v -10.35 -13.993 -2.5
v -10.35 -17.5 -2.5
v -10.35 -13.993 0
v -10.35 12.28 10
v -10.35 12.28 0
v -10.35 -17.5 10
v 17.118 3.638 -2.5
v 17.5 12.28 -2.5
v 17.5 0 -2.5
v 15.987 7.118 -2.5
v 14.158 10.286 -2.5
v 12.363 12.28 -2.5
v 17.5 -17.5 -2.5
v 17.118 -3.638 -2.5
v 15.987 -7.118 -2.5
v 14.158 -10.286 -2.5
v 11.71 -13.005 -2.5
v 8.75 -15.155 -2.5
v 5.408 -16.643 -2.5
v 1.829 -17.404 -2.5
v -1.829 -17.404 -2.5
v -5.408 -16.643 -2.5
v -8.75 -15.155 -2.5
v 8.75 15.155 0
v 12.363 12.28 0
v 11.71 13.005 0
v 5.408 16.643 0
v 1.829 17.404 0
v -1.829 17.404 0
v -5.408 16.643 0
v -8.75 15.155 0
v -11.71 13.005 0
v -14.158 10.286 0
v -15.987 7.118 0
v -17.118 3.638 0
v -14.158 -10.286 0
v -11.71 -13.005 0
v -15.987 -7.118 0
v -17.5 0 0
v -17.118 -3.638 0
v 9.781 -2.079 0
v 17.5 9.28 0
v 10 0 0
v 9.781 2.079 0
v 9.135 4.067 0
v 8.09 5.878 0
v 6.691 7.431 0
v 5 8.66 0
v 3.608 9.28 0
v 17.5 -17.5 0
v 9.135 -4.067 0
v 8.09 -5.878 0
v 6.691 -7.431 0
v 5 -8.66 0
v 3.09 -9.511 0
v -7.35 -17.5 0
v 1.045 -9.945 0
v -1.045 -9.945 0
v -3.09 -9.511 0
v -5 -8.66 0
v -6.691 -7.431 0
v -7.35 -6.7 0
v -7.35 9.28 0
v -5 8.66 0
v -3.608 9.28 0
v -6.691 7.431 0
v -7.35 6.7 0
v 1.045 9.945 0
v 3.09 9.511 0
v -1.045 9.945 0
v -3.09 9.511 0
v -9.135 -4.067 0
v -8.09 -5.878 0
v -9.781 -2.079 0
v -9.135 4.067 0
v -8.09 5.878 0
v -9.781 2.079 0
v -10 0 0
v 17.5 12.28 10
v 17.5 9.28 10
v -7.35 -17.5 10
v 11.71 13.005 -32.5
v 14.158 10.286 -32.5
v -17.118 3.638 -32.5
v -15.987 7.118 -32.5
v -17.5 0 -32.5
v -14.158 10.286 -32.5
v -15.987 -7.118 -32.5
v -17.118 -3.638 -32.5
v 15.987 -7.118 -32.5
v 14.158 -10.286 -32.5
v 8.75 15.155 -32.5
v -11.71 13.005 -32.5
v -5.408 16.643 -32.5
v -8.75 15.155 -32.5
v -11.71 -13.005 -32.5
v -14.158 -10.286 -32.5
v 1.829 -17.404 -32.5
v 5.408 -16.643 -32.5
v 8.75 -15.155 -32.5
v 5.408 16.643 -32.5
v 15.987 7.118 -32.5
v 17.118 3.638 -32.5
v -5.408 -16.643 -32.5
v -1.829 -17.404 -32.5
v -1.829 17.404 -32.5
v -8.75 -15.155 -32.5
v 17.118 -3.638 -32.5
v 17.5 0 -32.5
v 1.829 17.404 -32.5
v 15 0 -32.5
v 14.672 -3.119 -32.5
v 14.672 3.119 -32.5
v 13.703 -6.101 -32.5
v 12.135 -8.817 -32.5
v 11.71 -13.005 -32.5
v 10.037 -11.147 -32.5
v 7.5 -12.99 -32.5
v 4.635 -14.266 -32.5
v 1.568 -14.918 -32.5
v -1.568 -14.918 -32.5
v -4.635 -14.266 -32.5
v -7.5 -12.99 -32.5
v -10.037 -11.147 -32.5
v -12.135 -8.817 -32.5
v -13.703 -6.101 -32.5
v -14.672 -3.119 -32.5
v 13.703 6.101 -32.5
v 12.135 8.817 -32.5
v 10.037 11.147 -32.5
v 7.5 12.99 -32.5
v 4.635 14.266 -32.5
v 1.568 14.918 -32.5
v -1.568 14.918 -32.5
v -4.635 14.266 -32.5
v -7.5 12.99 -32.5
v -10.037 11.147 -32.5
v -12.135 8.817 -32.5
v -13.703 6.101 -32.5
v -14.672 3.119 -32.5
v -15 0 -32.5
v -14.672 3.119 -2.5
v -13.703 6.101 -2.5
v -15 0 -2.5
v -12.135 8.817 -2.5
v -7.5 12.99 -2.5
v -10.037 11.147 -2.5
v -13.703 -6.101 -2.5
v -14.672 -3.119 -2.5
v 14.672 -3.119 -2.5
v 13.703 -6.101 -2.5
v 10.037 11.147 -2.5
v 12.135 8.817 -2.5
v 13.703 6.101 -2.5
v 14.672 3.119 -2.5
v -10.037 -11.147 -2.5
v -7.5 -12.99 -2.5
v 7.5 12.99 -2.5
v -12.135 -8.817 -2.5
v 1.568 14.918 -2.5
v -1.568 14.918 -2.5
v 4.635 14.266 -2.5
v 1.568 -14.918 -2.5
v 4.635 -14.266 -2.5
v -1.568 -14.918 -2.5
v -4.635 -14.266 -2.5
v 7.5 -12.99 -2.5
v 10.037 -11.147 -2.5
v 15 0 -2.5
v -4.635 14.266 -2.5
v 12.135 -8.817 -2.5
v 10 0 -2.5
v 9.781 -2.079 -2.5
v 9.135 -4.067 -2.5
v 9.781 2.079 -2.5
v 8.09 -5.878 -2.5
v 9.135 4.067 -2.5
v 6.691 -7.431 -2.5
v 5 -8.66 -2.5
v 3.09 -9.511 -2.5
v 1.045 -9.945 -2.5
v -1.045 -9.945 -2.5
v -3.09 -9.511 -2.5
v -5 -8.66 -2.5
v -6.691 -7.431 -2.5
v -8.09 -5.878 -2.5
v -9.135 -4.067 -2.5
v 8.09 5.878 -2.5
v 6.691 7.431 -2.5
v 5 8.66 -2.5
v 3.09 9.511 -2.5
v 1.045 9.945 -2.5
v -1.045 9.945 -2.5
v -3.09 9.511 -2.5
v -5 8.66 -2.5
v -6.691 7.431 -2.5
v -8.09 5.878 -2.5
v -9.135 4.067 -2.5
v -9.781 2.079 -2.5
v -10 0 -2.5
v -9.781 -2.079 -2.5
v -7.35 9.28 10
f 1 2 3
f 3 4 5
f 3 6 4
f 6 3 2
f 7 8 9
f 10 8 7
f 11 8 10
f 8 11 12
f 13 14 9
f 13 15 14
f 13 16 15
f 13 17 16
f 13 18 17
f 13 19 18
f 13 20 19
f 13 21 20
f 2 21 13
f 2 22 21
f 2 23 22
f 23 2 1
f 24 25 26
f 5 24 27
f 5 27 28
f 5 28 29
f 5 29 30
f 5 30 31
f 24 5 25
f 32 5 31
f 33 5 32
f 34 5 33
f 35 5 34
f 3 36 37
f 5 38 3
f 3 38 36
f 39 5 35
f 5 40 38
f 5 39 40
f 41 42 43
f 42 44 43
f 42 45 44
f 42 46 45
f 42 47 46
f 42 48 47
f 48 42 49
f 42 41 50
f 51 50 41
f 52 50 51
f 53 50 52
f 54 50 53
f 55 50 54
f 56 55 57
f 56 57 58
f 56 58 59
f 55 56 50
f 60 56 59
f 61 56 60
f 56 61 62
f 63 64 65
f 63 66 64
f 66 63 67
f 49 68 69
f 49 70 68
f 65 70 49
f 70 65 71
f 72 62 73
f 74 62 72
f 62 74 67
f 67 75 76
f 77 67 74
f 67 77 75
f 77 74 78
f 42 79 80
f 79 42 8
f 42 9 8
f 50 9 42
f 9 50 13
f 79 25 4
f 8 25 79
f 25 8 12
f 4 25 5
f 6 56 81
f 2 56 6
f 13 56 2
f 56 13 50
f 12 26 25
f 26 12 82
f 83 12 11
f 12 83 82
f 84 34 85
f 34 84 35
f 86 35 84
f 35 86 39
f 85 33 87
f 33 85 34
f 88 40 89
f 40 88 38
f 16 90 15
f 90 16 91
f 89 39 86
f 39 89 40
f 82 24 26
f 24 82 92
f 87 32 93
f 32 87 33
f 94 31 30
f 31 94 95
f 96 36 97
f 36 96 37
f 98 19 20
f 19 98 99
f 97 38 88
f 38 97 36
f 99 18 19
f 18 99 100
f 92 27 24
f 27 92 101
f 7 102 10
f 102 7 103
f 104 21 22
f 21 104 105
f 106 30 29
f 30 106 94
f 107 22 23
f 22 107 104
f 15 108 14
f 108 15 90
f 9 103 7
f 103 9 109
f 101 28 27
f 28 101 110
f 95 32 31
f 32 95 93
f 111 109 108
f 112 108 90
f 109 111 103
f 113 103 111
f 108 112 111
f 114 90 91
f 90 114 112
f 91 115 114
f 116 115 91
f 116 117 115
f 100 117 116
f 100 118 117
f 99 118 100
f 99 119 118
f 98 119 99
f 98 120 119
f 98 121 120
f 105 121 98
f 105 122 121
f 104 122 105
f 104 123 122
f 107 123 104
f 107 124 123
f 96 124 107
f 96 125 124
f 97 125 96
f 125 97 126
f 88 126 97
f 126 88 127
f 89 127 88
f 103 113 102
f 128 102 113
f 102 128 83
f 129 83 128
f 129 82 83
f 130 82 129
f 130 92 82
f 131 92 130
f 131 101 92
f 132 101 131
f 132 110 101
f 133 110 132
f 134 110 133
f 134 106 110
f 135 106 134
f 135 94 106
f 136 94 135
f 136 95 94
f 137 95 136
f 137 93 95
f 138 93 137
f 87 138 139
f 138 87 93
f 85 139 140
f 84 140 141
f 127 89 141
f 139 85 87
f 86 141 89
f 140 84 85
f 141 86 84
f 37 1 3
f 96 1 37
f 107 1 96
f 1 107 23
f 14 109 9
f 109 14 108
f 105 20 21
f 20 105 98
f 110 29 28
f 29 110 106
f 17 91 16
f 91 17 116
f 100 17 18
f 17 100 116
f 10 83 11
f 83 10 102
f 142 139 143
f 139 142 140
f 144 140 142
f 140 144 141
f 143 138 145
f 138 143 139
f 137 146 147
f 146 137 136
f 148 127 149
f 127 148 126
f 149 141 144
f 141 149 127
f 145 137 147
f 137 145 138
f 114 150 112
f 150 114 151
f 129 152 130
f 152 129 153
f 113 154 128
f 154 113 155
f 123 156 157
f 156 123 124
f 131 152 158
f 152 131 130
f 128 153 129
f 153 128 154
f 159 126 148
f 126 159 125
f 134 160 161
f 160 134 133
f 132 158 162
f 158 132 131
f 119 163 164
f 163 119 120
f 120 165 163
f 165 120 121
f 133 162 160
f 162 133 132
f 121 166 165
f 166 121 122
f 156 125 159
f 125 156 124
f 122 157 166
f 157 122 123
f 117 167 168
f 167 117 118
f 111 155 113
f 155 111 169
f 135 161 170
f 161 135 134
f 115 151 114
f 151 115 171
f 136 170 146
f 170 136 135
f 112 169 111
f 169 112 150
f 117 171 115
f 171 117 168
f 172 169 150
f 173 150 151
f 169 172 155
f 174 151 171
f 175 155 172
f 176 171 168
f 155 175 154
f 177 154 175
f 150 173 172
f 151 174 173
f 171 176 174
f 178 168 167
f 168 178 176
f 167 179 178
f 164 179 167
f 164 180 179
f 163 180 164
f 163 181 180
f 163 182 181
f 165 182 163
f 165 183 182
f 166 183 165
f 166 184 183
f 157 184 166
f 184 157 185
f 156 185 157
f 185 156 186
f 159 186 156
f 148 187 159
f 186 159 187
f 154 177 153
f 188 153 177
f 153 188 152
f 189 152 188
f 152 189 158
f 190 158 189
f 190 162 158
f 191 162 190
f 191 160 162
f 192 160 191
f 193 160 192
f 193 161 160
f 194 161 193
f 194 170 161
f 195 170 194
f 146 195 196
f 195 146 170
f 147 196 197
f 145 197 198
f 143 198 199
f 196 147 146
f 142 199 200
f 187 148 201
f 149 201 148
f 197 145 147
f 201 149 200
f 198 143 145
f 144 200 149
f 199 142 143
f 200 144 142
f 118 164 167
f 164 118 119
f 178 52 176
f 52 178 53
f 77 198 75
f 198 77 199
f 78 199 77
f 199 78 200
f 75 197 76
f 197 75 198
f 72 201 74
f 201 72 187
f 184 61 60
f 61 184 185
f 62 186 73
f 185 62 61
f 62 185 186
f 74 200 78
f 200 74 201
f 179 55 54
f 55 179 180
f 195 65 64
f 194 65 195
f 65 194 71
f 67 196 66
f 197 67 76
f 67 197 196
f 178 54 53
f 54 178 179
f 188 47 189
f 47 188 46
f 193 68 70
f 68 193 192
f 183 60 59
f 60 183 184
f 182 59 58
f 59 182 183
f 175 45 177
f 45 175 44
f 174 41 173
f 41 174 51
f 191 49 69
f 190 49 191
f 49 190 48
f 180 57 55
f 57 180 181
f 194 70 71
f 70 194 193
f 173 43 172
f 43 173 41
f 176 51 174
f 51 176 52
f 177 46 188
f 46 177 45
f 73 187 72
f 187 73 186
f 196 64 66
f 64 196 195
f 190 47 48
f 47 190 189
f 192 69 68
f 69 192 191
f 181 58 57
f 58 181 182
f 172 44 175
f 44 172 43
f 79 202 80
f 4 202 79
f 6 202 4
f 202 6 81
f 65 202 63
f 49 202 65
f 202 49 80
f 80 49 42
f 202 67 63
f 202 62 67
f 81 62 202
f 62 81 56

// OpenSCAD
eyepiece_diameter = 30; 
distance_away = 2.5; 
lens_diameter = 20;
cam_x = 9.28; 
cam_y = 7.35; 
wall_height = 10; 
wall_thickness = 3;
tube_length= 30; 

outer_diameter = eyepiece_diameter+5; 
plate_w = cam_y + outer_diameter/2 + wall_thickness; 
plate_h = cam_x + outer_diameter/2 + wall_thickness; 

rotate([0,180,0]){
difference(){ 
	union(){ 
		translate([cam_y - plate_w + wall_thickness, cam_x - plate_h + wall_thickness, 0]){ 
			cube([plate_w, plate_h, 2.5]); 
		}
		cylinder(tube_length + distance_away, outer_diameter/2, outer_diameter/2);
	}
	translate([0,0,distance_away]){ 
		cylinder(tube_length + distance_away, eyepiece_diameter/2, eyepiece_diameter/2);
	} 
	translate([0,0,-1]){
		cylinder(tube_length + distance_away, lens_diameter/2, lens_diameter/2);
	}
}
translate([-outer_diameter/2,cam_x,-wall_height]){
	cube([plate_w, wall_thickness, wall_height]);
}
translate([cam_y,-outer_diameter/2,-wall_height]){
	cube([wall_thickness, plate_h, wall_height]);
}
}
